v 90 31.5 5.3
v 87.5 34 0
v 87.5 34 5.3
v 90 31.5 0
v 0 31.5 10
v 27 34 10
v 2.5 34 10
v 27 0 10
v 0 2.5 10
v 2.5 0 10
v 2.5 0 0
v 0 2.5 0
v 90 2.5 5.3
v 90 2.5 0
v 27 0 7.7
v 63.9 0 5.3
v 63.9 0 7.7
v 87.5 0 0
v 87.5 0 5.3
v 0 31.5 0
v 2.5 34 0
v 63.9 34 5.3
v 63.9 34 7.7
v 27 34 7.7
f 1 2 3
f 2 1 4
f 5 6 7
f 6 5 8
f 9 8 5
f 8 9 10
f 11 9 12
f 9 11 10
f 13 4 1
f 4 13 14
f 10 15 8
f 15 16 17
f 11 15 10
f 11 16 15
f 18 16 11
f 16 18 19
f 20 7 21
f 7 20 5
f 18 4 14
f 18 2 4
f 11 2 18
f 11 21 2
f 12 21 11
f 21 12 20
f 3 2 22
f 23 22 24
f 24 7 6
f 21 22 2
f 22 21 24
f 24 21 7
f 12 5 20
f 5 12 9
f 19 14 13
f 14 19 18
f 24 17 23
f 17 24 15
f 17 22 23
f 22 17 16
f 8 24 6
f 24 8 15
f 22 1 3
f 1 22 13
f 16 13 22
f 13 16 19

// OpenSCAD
$fn = 32;

// ----------------------------------------------------------------------
// Stepped bar: twostep, 90 x 34 x 10/5.3 mm
// ----------------------------------------------------------------------

// --- parameters (mm) ---
bar_l = 90;               // bar length, X
bar_w = 34;               // bar width, Y
plate_t = 10;             // thickness of the thick zone, Z
thin_t = 5.3;             // thickness of the thin zone
corner_c = 2.5;           // corner chamfer of the bar
step_cut = 4.7;           // material removed from the thin zone
stair1_x = 27;            // position of the first stair
stair2_x = 63.9;          // position of the second stair
mid_t = 7.7;              // thickness of the middle zone
depth_1 = 2.3;            // depth of cut 1 from the top face
depth_2 = 4.7;            // depth of cut 2 from the top face

profile = [[2.5, 0], [87.5, 0], [90, 2.5], [90, 31.5], [87.5, 34], [2.5, 34], [0, 31.5], [0, 2.5]];  // primary outline, 8 points, counter clockwise
void_1 = [[27, -1], [63.9, -1], [63.9, 35], [27, 35]];  // first stair, 4 points
void_2 = [[63.9, -1], [91, -1], [91, 35], [63.9, 35]];  // second stair, 4 points

// --- the one profile operation ---
difference() {
  linear_extrude(height = plate_t) polygon(points = profile);
  translate([0, 0, plate_t - depth_1])
    linear_extrude(height = depth_1 + 1) polygon(points = void_1);
  translate([0, 0, plate_t - depth_2])
    linear_extrude(height = depth_2 + 1) polygon(points = void_2);
}
